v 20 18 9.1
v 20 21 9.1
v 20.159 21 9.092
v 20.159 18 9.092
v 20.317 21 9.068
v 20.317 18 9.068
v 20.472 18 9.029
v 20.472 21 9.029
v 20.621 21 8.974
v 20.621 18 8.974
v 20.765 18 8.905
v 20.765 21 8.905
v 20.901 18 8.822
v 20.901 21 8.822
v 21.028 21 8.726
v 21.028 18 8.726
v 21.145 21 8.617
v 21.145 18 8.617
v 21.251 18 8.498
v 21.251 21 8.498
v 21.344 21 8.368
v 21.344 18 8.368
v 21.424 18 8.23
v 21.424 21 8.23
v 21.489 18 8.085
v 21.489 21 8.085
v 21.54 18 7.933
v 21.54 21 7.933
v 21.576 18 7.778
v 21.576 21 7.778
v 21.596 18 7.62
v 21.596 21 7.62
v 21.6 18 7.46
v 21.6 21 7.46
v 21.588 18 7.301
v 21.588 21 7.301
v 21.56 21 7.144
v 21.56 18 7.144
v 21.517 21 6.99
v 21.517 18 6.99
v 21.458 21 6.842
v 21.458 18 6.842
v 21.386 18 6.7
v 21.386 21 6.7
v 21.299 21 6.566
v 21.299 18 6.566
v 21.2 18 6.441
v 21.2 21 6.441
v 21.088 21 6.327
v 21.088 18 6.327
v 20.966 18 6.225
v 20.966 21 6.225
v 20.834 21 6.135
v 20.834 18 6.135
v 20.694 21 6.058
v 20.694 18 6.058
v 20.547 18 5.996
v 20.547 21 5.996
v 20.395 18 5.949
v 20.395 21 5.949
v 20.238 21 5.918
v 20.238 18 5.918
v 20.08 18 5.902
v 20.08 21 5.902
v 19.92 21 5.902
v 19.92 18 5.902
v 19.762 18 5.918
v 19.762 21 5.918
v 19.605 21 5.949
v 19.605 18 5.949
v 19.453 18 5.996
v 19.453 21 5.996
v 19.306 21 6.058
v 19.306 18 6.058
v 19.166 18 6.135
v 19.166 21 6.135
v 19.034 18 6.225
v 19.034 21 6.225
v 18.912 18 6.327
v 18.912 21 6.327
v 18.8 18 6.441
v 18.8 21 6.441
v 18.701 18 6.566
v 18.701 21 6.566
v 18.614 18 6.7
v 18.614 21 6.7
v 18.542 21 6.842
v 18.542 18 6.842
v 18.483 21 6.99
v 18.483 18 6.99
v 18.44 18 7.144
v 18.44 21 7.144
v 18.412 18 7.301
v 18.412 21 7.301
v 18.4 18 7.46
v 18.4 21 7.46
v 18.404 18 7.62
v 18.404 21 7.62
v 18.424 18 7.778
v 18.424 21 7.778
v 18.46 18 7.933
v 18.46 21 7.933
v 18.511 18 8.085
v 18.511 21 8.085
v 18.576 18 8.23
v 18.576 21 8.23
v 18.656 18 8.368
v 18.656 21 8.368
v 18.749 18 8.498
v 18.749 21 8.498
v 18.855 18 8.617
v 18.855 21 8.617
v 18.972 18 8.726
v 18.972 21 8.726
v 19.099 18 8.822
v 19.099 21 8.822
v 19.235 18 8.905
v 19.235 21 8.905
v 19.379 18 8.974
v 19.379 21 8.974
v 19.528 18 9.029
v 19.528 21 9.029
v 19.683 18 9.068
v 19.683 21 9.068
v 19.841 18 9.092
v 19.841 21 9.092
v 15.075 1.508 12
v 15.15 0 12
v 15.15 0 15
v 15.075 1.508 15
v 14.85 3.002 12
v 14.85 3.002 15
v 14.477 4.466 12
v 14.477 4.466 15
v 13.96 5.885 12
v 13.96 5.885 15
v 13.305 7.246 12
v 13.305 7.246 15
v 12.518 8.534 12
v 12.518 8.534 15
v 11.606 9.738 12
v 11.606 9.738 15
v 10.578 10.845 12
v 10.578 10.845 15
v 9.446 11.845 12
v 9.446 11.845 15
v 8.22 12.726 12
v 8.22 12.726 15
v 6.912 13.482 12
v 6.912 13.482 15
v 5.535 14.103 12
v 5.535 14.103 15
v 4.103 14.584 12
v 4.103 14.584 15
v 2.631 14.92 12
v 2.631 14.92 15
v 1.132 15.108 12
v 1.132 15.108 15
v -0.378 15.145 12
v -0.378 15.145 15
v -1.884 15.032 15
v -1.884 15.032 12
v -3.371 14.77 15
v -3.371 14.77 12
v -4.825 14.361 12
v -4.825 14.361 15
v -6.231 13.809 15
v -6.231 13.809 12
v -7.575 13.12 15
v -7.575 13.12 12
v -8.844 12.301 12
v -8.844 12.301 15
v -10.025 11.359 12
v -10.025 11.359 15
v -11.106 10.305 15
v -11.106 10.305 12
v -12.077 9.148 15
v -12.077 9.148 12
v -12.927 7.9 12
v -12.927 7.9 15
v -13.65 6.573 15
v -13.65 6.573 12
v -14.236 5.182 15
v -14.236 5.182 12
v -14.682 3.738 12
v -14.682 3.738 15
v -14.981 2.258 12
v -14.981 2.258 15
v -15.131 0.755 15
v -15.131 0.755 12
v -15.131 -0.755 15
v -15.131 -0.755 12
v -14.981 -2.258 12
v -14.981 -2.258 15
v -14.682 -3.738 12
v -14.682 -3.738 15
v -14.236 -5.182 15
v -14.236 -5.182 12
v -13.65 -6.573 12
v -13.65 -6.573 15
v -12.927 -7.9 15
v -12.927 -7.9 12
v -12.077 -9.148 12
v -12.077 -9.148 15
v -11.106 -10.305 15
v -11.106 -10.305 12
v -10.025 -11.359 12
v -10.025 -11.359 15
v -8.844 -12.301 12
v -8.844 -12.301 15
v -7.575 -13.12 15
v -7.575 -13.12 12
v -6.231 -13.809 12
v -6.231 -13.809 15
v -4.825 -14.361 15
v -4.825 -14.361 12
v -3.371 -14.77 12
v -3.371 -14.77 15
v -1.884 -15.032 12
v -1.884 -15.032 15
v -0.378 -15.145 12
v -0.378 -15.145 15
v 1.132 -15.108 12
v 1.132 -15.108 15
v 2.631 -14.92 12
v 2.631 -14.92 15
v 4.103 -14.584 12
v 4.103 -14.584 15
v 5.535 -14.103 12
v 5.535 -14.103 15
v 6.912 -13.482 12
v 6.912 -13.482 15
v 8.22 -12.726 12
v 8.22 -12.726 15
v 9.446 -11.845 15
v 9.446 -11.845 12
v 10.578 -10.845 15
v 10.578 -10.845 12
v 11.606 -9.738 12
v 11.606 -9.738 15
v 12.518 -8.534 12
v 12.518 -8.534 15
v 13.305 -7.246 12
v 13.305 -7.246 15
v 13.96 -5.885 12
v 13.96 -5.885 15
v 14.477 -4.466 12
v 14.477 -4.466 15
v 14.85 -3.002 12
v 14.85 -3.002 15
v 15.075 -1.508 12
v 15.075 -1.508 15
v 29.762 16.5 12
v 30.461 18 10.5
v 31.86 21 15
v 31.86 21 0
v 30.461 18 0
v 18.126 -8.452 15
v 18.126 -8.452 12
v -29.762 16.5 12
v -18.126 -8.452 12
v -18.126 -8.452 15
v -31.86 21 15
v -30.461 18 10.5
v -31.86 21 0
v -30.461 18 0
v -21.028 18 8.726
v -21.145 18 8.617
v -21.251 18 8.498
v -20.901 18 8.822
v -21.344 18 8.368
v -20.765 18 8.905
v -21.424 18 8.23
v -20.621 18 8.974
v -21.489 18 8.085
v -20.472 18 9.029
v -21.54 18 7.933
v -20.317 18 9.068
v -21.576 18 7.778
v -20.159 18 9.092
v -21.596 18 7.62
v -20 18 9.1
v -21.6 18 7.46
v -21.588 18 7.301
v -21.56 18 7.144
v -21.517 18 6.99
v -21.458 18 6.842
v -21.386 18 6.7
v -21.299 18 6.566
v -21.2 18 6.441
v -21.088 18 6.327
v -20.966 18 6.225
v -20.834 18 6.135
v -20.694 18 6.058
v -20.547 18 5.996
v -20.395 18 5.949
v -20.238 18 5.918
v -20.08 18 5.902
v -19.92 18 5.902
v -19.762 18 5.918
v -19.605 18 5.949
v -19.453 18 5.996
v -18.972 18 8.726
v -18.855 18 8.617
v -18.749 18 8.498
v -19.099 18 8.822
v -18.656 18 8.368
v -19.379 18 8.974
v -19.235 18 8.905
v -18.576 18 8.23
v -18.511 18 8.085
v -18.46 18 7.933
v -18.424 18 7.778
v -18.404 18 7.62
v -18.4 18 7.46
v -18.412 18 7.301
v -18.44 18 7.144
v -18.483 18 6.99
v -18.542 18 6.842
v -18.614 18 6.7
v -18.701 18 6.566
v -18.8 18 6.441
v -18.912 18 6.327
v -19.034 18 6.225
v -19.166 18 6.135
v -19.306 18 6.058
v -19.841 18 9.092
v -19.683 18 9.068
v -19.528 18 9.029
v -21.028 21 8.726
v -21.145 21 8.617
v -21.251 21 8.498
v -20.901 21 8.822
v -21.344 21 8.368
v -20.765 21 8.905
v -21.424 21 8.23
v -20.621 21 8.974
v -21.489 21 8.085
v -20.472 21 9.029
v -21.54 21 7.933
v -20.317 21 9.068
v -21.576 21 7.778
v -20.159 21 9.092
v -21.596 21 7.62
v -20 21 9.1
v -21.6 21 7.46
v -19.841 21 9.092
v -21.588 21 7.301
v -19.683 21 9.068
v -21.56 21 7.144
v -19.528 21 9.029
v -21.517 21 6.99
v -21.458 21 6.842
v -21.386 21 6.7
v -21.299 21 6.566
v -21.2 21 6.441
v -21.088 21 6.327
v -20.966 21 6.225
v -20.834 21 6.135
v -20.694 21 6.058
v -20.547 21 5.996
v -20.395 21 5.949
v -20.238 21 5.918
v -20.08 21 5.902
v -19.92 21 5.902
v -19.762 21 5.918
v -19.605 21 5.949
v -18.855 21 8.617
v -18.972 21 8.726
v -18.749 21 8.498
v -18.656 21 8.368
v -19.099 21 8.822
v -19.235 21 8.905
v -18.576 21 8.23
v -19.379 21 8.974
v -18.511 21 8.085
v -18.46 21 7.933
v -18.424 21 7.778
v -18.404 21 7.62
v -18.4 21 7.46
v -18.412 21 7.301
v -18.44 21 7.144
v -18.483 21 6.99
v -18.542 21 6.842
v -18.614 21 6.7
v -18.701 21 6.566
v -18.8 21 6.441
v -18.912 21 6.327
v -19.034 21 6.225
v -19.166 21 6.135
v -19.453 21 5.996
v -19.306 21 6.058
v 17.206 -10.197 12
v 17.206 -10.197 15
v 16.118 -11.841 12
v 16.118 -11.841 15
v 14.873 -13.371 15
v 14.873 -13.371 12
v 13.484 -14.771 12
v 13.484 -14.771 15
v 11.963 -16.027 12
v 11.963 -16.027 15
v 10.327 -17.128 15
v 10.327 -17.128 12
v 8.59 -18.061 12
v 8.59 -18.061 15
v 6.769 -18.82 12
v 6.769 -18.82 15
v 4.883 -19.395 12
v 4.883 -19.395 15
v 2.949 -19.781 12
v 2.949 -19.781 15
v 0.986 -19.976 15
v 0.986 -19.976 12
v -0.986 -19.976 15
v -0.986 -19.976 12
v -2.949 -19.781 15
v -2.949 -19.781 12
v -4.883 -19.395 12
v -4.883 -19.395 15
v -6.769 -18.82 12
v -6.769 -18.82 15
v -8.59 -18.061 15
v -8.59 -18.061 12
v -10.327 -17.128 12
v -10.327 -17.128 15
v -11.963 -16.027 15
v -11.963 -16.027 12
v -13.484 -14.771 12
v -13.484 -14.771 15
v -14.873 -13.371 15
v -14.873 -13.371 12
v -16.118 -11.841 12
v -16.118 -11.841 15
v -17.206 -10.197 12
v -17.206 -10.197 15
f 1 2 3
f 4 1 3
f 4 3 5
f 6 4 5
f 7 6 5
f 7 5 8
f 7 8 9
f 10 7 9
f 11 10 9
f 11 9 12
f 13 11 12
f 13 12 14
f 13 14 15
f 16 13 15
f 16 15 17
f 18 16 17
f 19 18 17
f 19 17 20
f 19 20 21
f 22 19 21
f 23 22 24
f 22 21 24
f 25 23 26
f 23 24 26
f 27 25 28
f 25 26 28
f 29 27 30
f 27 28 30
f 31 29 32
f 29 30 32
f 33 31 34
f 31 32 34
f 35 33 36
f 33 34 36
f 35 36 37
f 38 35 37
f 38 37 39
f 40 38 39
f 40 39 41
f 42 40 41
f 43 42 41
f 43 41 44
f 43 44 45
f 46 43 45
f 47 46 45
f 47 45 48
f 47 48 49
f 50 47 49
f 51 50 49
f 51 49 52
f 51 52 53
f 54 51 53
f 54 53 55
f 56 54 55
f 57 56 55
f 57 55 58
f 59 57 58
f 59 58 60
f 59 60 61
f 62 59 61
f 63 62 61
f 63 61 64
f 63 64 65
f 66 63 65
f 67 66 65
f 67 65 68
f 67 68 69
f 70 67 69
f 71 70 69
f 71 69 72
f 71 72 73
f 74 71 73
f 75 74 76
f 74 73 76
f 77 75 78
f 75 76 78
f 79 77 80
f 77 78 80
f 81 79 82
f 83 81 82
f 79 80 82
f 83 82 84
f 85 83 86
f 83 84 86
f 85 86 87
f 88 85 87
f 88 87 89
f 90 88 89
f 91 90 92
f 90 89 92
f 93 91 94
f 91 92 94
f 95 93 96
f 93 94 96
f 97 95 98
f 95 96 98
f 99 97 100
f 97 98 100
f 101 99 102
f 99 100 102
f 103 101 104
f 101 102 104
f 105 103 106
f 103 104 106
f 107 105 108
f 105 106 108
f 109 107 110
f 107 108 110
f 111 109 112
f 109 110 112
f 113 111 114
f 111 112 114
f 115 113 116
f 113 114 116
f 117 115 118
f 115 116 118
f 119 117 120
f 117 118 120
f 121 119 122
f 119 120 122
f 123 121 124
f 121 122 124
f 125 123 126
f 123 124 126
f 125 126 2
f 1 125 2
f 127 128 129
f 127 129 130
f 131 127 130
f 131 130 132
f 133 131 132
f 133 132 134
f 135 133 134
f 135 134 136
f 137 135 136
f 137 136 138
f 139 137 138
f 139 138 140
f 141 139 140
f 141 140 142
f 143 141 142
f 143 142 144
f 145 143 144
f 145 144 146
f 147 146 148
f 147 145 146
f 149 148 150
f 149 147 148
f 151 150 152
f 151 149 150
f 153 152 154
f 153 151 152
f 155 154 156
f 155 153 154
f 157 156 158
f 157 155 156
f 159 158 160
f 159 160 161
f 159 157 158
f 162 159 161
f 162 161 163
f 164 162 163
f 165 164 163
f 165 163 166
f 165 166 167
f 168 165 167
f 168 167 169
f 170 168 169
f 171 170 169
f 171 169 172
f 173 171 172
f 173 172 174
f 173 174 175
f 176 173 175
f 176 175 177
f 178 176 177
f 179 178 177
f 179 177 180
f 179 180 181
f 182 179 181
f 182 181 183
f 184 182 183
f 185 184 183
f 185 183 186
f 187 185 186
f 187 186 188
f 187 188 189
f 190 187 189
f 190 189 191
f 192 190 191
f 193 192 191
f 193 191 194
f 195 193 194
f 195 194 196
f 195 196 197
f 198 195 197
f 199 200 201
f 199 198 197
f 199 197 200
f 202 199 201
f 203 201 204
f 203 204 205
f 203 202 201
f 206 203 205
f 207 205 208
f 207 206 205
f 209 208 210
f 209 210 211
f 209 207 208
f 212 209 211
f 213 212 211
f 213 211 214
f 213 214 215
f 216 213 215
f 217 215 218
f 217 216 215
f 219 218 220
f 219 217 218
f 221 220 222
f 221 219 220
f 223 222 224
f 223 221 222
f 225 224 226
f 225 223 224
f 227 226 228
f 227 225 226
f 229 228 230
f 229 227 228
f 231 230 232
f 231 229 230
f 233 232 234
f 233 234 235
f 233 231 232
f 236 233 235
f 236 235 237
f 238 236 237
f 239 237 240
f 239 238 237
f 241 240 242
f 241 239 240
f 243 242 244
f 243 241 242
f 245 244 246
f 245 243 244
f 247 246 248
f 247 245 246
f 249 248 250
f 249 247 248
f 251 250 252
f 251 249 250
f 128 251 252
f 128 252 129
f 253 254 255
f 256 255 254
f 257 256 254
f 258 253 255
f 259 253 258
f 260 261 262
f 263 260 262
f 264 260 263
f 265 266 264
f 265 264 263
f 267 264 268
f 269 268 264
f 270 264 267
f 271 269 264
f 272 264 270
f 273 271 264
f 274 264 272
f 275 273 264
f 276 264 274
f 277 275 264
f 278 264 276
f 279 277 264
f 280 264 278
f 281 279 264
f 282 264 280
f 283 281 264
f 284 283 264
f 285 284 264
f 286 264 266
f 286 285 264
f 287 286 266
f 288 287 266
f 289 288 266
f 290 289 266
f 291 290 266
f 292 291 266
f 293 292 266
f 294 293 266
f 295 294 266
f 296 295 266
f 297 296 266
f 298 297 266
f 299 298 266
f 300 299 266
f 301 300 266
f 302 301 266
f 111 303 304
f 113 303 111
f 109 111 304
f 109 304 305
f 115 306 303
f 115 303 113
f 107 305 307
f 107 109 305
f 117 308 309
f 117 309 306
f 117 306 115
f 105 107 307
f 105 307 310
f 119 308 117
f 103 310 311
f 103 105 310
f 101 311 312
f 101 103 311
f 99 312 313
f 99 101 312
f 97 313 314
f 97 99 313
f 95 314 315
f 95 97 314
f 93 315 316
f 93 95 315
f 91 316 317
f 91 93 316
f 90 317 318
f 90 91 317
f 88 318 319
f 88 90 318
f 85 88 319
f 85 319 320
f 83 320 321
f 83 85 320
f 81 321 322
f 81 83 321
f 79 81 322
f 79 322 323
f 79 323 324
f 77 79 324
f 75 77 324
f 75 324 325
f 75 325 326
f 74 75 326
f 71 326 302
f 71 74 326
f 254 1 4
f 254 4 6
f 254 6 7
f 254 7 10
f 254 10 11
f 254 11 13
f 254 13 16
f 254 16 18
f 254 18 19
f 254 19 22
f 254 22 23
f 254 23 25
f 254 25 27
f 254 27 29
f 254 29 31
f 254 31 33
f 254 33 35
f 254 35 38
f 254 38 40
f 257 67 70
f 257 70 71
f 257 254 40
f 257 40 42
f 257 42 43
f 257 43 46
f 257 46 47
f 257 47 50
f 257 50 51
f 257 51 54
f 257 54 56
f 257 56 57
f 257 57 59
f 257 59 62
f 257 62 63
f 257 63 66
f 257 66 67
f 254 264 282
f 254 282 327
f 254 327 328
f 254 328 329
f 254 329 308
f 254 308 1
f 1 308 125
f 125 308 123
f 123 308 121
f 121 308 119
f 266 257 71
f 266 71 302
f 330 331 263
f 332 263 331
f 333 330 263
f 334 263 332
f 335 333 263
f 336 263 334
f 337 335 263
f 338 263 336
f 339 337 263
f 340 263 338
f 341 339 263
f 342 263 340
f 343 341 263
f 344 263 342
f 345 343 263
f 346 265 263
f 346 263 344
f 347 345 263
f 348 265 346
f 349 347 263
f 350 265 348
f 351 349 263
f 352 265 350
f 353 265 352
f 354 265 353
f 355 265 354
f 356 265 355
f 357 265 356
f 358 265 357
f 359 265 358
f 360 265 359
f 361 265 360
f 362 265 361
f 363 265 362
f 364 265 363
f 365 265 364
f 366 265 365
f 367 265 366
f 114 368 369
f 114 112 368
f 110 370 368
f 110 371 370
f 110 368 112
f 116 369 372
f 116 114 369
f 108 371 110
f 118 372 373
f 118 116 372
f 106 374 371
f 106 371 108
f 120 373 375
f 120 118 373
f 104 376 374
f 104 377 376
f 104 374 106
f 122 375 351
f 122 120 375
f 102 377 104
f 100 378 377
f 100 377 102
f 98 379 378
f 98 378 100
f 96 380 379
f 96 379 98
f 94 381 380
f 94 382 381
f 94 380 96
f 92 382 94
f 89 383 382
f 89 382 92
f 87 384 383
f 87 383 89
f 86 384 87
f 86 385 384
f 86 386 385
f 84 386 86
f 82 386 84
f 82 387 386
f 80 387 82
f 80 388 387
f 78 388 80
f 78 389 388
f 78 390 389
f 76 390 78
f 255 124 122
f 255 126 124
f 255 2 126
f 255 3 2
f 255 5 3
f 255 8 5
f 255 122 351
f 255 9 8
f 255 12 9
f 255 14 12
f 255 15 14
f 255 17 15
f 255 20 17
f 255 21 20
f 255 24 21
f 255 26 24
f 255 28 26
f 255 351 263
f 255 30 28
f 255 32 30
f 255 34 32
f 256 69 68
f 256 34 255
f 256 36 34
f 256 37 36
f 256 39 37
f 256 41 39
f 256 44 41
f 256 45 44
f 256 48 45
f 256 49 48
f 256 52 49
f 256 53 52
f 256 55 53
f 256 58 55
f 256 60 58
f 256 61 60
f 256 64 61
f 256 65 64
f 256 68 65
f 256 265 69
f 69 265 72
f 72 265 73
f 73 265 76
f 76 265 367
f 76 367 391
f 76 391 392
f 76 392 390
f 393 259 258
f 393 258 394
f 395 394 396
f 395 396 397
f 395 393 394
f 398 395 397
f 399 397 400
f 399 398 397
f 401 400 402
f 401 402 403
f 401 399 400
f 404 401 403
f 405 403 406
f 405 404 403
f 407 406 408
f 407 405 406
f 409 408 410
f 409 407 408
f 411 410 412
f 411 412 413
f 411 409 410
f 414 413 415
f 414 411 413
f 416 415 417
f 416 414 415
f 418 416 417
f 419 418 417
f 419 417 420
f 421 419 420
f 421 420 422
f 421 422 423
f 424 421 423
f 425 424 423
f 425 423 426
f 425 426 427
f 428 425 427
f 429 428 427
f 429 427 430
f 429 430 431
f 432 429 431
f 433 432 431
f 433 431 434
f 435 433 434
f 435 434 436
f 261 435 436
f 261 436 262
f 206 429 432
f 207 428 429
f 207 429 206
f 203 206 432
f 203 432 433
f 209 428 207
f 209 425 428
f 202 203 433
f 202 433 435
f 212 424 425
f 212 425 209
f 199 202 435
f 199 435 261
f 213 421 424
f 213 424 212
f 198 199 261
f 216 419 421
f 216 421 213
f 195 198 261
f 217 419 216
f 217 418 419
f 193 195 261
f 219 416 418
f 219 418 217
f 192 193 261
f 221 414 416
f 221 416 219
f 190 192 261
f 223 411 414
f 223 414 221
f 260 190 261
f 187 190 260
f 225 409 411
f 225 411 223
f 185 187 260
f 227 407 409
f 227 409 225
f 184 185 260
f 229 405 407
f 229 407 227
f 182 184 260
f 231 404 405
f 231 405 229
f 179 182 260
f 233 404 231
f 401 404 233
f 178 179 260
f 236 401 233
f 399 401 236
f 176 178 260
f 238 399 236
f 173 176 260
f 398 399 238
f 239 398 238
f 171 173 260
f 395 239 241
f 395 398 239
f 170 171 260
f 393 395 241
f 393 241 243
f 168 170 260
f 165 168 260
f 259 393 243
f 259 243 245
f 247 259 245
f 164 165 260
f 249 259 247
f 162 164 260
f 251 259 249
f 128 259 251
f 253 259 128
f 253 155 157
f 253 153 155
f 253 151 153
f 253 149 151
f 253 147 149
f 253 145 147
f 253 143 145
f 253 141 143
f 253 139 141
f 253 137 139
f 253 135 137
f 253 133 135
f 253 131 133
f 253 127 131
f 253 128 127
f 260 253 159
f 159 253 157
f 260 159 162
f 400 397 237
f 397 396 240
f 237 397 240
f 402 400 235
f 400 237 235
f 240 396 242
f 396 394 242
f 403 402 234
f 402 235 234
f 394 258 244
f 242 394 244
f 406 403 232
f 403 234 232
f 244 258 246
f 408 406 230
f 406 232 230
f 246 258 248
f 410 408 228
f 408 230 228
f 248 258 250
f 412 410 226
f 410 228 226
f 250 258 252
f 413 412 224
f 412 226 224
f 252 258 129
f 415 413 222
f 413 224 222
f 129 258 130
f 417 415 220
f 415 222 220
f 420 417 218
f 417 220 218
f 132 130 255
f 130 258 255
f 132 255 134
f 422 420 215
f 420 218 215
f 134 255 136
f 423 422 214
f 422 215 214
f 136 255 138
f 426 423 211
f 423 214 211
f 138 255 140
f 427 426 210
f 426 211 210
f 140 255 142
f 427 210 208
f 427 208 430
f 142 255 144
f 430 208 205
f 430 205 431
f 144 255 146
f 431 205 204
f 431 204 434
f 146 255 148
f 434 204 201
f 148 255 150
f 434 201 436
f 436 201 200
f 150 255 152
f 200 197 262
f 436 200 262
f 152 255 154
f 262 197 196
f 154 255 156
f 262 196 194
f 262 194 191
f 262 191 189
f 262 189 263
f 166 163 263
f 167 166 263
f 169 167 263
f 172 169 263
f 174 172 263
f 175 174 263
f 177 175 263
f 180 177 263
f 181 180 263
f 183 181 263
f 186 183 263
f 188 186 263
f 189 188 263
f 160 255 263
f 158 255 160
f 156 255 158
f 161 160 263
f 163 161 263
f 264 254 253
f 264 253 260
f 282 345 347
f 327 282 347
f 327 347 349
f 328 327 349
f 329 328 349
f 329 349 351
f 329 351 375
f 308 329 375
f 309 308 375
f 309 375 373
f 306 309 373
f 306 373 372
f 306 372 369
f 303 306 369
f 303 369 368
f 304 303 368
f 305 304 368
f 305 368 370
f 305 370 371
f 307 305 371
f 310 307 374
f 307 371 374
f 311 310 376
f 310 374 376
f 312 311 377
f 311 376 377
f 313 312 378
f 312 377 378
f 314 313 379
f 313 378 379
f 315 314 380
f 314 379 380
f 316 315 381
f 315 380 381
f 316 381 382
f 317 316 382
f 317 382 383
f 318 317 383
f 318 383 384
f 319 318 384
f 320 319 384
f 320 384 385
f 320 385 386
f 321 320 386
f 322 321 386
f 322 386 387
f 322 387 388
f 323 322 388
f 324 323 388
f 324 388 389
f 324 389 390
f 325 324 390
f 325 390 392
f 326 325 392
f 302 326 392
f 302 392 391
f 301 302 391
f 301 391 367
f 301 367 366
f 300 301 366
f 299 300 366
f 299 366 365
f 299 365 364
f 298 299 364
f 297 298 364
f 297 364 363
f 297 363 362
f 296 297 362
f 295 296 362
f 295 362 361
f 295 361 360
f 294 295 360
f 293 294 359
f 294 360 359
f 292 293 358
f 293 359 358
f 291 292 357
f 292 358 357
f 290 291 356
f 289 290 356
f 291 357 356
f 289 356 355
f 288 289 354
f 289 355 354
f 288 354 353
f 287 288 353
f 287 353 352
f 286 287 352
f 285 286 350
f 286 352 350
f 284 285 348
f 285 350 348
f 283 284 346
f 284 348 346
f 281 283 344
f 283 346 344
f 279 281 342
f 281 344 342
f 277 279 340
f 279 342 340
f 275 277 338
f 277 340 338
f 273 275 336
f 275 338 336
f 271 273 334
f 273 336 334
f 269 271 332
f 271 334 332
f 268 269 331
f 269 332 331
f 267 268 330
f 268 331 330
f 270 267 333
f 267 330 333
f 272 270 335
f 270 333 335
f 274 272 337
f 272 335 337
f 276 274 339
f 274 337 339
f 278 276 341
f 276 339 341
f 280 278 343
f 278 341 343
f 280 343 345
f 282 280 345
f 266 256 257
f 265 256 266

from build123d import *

# Parameters (mm, degrees)
SKETCH_1_R          = 15.15
EXTRUDE_1_DEPTH     = 15
SKETCH_2_W          = 12
SKETCH_2_H          = 38
CUT_EXTRUDE_1_DEPTH = 35
CUT_EXTRUDE_2_REACH = 56.047
SKETCH_3_R          = 1.6
CHAMFER_1_SIZE      = 1.5


with BuildPart() as part:
    # ｽｹｯﾁ1 → ﾎﾞｽ - 押し出し1 (new body)
    with BuildSketch(Plane.XY):
        with BuildLine():
            Line((-18.126155741, -8.452365235), (-31.860019201, 21))
            Line((-31.860019201, 21), (31.860019201, 21))
            Line((31.860019201, 21), (18.126155741, -8.452365235))
            ThreePointArc((18.126155741, -8.452365235), (0, -20), (-18.126155741, -8.452365235))
        make_face()
        Circle(SKETCH_1_R, mode=Mode.SUBTRACT)
    extrude(amount=EXTRUDE_1_DEPTH)

    # ｽｹｯﾁ2 → ｶｯﾄ - 押し出し1 (cut, symmetric)
    with BuildSketch(Plane(origin=(0, 0, 0), x_dir=(0, 0, -1), z_dir=(1, 0, 0))):
        with Locations((-6, -1)):
            Rectangle(SKETCH_2_W, SKETCH_2_H)
    extrude(amount=CUT_EXTRUDE_1_DEPTH, both=True, mode=Mode.SUBTRACT)

    # ｽｹｯﾁ3 → ｶｯﾄ - 押し出し2 (cut, up to next)
    with BuildSketch(Plane(origin=(0, 21, 0), x_dir=(1, 0, 0), z_dir=(0, 1, 0)), mode=Mode.PRIVATE) as cut_extrude_2_sk1:
        with Locations(Location((-20, -7.5, 0), (0, 0, 270))):
            Circle(SKETCH_3_R)
    cut_extrude_2_tool1 = extrude(cut_extrude_2_sk1.sketch, amount=-CUT_EXTRUDE_2_REACH, mode=Mode.PRIVATE) & part.part
    # ｽｹｯﾁ3 → ｶｯﾄ - 押し出し2 (cut, up to next)
    with BuildSketch(Plane(origin=(0, 21, 0), x_dir=(1, 0, 0), z_dir=(0, 1, 0)), mode=Mode.PRIVATE) as cut_extrude_2_sk2:
        with Locations(Location((20, -7.5, 0), (0, 0, 270))):
            Circle(SKETCH_3_R)
    cut_extrude_2_tool2 = extrude(cut_extrude_2_sk2.sketch, amount=-CUT_EXTRUDE_2_REACH, mode=Mode.PRIVATE) & part.part
    add(cut_extrude_2_tool1.solids().sort_by_distance((-20, 21, 7.5))[0], mode=Mode.SUBTRACT)
    add(cut_extrude_2_tool2.solids().sort_by_distance((20, 21, 7.5))[0], mode=Mode.SUBTRACT)

    # 面取り1
    chamfer_1_edges = [part.edges().sort_by_distance(p)[0] for p in [
        (0, 18, 12),
    ]]
    chamfer(chamfer_1_edges, length=CHAMFER_1_SIZE)


solid = part.part
